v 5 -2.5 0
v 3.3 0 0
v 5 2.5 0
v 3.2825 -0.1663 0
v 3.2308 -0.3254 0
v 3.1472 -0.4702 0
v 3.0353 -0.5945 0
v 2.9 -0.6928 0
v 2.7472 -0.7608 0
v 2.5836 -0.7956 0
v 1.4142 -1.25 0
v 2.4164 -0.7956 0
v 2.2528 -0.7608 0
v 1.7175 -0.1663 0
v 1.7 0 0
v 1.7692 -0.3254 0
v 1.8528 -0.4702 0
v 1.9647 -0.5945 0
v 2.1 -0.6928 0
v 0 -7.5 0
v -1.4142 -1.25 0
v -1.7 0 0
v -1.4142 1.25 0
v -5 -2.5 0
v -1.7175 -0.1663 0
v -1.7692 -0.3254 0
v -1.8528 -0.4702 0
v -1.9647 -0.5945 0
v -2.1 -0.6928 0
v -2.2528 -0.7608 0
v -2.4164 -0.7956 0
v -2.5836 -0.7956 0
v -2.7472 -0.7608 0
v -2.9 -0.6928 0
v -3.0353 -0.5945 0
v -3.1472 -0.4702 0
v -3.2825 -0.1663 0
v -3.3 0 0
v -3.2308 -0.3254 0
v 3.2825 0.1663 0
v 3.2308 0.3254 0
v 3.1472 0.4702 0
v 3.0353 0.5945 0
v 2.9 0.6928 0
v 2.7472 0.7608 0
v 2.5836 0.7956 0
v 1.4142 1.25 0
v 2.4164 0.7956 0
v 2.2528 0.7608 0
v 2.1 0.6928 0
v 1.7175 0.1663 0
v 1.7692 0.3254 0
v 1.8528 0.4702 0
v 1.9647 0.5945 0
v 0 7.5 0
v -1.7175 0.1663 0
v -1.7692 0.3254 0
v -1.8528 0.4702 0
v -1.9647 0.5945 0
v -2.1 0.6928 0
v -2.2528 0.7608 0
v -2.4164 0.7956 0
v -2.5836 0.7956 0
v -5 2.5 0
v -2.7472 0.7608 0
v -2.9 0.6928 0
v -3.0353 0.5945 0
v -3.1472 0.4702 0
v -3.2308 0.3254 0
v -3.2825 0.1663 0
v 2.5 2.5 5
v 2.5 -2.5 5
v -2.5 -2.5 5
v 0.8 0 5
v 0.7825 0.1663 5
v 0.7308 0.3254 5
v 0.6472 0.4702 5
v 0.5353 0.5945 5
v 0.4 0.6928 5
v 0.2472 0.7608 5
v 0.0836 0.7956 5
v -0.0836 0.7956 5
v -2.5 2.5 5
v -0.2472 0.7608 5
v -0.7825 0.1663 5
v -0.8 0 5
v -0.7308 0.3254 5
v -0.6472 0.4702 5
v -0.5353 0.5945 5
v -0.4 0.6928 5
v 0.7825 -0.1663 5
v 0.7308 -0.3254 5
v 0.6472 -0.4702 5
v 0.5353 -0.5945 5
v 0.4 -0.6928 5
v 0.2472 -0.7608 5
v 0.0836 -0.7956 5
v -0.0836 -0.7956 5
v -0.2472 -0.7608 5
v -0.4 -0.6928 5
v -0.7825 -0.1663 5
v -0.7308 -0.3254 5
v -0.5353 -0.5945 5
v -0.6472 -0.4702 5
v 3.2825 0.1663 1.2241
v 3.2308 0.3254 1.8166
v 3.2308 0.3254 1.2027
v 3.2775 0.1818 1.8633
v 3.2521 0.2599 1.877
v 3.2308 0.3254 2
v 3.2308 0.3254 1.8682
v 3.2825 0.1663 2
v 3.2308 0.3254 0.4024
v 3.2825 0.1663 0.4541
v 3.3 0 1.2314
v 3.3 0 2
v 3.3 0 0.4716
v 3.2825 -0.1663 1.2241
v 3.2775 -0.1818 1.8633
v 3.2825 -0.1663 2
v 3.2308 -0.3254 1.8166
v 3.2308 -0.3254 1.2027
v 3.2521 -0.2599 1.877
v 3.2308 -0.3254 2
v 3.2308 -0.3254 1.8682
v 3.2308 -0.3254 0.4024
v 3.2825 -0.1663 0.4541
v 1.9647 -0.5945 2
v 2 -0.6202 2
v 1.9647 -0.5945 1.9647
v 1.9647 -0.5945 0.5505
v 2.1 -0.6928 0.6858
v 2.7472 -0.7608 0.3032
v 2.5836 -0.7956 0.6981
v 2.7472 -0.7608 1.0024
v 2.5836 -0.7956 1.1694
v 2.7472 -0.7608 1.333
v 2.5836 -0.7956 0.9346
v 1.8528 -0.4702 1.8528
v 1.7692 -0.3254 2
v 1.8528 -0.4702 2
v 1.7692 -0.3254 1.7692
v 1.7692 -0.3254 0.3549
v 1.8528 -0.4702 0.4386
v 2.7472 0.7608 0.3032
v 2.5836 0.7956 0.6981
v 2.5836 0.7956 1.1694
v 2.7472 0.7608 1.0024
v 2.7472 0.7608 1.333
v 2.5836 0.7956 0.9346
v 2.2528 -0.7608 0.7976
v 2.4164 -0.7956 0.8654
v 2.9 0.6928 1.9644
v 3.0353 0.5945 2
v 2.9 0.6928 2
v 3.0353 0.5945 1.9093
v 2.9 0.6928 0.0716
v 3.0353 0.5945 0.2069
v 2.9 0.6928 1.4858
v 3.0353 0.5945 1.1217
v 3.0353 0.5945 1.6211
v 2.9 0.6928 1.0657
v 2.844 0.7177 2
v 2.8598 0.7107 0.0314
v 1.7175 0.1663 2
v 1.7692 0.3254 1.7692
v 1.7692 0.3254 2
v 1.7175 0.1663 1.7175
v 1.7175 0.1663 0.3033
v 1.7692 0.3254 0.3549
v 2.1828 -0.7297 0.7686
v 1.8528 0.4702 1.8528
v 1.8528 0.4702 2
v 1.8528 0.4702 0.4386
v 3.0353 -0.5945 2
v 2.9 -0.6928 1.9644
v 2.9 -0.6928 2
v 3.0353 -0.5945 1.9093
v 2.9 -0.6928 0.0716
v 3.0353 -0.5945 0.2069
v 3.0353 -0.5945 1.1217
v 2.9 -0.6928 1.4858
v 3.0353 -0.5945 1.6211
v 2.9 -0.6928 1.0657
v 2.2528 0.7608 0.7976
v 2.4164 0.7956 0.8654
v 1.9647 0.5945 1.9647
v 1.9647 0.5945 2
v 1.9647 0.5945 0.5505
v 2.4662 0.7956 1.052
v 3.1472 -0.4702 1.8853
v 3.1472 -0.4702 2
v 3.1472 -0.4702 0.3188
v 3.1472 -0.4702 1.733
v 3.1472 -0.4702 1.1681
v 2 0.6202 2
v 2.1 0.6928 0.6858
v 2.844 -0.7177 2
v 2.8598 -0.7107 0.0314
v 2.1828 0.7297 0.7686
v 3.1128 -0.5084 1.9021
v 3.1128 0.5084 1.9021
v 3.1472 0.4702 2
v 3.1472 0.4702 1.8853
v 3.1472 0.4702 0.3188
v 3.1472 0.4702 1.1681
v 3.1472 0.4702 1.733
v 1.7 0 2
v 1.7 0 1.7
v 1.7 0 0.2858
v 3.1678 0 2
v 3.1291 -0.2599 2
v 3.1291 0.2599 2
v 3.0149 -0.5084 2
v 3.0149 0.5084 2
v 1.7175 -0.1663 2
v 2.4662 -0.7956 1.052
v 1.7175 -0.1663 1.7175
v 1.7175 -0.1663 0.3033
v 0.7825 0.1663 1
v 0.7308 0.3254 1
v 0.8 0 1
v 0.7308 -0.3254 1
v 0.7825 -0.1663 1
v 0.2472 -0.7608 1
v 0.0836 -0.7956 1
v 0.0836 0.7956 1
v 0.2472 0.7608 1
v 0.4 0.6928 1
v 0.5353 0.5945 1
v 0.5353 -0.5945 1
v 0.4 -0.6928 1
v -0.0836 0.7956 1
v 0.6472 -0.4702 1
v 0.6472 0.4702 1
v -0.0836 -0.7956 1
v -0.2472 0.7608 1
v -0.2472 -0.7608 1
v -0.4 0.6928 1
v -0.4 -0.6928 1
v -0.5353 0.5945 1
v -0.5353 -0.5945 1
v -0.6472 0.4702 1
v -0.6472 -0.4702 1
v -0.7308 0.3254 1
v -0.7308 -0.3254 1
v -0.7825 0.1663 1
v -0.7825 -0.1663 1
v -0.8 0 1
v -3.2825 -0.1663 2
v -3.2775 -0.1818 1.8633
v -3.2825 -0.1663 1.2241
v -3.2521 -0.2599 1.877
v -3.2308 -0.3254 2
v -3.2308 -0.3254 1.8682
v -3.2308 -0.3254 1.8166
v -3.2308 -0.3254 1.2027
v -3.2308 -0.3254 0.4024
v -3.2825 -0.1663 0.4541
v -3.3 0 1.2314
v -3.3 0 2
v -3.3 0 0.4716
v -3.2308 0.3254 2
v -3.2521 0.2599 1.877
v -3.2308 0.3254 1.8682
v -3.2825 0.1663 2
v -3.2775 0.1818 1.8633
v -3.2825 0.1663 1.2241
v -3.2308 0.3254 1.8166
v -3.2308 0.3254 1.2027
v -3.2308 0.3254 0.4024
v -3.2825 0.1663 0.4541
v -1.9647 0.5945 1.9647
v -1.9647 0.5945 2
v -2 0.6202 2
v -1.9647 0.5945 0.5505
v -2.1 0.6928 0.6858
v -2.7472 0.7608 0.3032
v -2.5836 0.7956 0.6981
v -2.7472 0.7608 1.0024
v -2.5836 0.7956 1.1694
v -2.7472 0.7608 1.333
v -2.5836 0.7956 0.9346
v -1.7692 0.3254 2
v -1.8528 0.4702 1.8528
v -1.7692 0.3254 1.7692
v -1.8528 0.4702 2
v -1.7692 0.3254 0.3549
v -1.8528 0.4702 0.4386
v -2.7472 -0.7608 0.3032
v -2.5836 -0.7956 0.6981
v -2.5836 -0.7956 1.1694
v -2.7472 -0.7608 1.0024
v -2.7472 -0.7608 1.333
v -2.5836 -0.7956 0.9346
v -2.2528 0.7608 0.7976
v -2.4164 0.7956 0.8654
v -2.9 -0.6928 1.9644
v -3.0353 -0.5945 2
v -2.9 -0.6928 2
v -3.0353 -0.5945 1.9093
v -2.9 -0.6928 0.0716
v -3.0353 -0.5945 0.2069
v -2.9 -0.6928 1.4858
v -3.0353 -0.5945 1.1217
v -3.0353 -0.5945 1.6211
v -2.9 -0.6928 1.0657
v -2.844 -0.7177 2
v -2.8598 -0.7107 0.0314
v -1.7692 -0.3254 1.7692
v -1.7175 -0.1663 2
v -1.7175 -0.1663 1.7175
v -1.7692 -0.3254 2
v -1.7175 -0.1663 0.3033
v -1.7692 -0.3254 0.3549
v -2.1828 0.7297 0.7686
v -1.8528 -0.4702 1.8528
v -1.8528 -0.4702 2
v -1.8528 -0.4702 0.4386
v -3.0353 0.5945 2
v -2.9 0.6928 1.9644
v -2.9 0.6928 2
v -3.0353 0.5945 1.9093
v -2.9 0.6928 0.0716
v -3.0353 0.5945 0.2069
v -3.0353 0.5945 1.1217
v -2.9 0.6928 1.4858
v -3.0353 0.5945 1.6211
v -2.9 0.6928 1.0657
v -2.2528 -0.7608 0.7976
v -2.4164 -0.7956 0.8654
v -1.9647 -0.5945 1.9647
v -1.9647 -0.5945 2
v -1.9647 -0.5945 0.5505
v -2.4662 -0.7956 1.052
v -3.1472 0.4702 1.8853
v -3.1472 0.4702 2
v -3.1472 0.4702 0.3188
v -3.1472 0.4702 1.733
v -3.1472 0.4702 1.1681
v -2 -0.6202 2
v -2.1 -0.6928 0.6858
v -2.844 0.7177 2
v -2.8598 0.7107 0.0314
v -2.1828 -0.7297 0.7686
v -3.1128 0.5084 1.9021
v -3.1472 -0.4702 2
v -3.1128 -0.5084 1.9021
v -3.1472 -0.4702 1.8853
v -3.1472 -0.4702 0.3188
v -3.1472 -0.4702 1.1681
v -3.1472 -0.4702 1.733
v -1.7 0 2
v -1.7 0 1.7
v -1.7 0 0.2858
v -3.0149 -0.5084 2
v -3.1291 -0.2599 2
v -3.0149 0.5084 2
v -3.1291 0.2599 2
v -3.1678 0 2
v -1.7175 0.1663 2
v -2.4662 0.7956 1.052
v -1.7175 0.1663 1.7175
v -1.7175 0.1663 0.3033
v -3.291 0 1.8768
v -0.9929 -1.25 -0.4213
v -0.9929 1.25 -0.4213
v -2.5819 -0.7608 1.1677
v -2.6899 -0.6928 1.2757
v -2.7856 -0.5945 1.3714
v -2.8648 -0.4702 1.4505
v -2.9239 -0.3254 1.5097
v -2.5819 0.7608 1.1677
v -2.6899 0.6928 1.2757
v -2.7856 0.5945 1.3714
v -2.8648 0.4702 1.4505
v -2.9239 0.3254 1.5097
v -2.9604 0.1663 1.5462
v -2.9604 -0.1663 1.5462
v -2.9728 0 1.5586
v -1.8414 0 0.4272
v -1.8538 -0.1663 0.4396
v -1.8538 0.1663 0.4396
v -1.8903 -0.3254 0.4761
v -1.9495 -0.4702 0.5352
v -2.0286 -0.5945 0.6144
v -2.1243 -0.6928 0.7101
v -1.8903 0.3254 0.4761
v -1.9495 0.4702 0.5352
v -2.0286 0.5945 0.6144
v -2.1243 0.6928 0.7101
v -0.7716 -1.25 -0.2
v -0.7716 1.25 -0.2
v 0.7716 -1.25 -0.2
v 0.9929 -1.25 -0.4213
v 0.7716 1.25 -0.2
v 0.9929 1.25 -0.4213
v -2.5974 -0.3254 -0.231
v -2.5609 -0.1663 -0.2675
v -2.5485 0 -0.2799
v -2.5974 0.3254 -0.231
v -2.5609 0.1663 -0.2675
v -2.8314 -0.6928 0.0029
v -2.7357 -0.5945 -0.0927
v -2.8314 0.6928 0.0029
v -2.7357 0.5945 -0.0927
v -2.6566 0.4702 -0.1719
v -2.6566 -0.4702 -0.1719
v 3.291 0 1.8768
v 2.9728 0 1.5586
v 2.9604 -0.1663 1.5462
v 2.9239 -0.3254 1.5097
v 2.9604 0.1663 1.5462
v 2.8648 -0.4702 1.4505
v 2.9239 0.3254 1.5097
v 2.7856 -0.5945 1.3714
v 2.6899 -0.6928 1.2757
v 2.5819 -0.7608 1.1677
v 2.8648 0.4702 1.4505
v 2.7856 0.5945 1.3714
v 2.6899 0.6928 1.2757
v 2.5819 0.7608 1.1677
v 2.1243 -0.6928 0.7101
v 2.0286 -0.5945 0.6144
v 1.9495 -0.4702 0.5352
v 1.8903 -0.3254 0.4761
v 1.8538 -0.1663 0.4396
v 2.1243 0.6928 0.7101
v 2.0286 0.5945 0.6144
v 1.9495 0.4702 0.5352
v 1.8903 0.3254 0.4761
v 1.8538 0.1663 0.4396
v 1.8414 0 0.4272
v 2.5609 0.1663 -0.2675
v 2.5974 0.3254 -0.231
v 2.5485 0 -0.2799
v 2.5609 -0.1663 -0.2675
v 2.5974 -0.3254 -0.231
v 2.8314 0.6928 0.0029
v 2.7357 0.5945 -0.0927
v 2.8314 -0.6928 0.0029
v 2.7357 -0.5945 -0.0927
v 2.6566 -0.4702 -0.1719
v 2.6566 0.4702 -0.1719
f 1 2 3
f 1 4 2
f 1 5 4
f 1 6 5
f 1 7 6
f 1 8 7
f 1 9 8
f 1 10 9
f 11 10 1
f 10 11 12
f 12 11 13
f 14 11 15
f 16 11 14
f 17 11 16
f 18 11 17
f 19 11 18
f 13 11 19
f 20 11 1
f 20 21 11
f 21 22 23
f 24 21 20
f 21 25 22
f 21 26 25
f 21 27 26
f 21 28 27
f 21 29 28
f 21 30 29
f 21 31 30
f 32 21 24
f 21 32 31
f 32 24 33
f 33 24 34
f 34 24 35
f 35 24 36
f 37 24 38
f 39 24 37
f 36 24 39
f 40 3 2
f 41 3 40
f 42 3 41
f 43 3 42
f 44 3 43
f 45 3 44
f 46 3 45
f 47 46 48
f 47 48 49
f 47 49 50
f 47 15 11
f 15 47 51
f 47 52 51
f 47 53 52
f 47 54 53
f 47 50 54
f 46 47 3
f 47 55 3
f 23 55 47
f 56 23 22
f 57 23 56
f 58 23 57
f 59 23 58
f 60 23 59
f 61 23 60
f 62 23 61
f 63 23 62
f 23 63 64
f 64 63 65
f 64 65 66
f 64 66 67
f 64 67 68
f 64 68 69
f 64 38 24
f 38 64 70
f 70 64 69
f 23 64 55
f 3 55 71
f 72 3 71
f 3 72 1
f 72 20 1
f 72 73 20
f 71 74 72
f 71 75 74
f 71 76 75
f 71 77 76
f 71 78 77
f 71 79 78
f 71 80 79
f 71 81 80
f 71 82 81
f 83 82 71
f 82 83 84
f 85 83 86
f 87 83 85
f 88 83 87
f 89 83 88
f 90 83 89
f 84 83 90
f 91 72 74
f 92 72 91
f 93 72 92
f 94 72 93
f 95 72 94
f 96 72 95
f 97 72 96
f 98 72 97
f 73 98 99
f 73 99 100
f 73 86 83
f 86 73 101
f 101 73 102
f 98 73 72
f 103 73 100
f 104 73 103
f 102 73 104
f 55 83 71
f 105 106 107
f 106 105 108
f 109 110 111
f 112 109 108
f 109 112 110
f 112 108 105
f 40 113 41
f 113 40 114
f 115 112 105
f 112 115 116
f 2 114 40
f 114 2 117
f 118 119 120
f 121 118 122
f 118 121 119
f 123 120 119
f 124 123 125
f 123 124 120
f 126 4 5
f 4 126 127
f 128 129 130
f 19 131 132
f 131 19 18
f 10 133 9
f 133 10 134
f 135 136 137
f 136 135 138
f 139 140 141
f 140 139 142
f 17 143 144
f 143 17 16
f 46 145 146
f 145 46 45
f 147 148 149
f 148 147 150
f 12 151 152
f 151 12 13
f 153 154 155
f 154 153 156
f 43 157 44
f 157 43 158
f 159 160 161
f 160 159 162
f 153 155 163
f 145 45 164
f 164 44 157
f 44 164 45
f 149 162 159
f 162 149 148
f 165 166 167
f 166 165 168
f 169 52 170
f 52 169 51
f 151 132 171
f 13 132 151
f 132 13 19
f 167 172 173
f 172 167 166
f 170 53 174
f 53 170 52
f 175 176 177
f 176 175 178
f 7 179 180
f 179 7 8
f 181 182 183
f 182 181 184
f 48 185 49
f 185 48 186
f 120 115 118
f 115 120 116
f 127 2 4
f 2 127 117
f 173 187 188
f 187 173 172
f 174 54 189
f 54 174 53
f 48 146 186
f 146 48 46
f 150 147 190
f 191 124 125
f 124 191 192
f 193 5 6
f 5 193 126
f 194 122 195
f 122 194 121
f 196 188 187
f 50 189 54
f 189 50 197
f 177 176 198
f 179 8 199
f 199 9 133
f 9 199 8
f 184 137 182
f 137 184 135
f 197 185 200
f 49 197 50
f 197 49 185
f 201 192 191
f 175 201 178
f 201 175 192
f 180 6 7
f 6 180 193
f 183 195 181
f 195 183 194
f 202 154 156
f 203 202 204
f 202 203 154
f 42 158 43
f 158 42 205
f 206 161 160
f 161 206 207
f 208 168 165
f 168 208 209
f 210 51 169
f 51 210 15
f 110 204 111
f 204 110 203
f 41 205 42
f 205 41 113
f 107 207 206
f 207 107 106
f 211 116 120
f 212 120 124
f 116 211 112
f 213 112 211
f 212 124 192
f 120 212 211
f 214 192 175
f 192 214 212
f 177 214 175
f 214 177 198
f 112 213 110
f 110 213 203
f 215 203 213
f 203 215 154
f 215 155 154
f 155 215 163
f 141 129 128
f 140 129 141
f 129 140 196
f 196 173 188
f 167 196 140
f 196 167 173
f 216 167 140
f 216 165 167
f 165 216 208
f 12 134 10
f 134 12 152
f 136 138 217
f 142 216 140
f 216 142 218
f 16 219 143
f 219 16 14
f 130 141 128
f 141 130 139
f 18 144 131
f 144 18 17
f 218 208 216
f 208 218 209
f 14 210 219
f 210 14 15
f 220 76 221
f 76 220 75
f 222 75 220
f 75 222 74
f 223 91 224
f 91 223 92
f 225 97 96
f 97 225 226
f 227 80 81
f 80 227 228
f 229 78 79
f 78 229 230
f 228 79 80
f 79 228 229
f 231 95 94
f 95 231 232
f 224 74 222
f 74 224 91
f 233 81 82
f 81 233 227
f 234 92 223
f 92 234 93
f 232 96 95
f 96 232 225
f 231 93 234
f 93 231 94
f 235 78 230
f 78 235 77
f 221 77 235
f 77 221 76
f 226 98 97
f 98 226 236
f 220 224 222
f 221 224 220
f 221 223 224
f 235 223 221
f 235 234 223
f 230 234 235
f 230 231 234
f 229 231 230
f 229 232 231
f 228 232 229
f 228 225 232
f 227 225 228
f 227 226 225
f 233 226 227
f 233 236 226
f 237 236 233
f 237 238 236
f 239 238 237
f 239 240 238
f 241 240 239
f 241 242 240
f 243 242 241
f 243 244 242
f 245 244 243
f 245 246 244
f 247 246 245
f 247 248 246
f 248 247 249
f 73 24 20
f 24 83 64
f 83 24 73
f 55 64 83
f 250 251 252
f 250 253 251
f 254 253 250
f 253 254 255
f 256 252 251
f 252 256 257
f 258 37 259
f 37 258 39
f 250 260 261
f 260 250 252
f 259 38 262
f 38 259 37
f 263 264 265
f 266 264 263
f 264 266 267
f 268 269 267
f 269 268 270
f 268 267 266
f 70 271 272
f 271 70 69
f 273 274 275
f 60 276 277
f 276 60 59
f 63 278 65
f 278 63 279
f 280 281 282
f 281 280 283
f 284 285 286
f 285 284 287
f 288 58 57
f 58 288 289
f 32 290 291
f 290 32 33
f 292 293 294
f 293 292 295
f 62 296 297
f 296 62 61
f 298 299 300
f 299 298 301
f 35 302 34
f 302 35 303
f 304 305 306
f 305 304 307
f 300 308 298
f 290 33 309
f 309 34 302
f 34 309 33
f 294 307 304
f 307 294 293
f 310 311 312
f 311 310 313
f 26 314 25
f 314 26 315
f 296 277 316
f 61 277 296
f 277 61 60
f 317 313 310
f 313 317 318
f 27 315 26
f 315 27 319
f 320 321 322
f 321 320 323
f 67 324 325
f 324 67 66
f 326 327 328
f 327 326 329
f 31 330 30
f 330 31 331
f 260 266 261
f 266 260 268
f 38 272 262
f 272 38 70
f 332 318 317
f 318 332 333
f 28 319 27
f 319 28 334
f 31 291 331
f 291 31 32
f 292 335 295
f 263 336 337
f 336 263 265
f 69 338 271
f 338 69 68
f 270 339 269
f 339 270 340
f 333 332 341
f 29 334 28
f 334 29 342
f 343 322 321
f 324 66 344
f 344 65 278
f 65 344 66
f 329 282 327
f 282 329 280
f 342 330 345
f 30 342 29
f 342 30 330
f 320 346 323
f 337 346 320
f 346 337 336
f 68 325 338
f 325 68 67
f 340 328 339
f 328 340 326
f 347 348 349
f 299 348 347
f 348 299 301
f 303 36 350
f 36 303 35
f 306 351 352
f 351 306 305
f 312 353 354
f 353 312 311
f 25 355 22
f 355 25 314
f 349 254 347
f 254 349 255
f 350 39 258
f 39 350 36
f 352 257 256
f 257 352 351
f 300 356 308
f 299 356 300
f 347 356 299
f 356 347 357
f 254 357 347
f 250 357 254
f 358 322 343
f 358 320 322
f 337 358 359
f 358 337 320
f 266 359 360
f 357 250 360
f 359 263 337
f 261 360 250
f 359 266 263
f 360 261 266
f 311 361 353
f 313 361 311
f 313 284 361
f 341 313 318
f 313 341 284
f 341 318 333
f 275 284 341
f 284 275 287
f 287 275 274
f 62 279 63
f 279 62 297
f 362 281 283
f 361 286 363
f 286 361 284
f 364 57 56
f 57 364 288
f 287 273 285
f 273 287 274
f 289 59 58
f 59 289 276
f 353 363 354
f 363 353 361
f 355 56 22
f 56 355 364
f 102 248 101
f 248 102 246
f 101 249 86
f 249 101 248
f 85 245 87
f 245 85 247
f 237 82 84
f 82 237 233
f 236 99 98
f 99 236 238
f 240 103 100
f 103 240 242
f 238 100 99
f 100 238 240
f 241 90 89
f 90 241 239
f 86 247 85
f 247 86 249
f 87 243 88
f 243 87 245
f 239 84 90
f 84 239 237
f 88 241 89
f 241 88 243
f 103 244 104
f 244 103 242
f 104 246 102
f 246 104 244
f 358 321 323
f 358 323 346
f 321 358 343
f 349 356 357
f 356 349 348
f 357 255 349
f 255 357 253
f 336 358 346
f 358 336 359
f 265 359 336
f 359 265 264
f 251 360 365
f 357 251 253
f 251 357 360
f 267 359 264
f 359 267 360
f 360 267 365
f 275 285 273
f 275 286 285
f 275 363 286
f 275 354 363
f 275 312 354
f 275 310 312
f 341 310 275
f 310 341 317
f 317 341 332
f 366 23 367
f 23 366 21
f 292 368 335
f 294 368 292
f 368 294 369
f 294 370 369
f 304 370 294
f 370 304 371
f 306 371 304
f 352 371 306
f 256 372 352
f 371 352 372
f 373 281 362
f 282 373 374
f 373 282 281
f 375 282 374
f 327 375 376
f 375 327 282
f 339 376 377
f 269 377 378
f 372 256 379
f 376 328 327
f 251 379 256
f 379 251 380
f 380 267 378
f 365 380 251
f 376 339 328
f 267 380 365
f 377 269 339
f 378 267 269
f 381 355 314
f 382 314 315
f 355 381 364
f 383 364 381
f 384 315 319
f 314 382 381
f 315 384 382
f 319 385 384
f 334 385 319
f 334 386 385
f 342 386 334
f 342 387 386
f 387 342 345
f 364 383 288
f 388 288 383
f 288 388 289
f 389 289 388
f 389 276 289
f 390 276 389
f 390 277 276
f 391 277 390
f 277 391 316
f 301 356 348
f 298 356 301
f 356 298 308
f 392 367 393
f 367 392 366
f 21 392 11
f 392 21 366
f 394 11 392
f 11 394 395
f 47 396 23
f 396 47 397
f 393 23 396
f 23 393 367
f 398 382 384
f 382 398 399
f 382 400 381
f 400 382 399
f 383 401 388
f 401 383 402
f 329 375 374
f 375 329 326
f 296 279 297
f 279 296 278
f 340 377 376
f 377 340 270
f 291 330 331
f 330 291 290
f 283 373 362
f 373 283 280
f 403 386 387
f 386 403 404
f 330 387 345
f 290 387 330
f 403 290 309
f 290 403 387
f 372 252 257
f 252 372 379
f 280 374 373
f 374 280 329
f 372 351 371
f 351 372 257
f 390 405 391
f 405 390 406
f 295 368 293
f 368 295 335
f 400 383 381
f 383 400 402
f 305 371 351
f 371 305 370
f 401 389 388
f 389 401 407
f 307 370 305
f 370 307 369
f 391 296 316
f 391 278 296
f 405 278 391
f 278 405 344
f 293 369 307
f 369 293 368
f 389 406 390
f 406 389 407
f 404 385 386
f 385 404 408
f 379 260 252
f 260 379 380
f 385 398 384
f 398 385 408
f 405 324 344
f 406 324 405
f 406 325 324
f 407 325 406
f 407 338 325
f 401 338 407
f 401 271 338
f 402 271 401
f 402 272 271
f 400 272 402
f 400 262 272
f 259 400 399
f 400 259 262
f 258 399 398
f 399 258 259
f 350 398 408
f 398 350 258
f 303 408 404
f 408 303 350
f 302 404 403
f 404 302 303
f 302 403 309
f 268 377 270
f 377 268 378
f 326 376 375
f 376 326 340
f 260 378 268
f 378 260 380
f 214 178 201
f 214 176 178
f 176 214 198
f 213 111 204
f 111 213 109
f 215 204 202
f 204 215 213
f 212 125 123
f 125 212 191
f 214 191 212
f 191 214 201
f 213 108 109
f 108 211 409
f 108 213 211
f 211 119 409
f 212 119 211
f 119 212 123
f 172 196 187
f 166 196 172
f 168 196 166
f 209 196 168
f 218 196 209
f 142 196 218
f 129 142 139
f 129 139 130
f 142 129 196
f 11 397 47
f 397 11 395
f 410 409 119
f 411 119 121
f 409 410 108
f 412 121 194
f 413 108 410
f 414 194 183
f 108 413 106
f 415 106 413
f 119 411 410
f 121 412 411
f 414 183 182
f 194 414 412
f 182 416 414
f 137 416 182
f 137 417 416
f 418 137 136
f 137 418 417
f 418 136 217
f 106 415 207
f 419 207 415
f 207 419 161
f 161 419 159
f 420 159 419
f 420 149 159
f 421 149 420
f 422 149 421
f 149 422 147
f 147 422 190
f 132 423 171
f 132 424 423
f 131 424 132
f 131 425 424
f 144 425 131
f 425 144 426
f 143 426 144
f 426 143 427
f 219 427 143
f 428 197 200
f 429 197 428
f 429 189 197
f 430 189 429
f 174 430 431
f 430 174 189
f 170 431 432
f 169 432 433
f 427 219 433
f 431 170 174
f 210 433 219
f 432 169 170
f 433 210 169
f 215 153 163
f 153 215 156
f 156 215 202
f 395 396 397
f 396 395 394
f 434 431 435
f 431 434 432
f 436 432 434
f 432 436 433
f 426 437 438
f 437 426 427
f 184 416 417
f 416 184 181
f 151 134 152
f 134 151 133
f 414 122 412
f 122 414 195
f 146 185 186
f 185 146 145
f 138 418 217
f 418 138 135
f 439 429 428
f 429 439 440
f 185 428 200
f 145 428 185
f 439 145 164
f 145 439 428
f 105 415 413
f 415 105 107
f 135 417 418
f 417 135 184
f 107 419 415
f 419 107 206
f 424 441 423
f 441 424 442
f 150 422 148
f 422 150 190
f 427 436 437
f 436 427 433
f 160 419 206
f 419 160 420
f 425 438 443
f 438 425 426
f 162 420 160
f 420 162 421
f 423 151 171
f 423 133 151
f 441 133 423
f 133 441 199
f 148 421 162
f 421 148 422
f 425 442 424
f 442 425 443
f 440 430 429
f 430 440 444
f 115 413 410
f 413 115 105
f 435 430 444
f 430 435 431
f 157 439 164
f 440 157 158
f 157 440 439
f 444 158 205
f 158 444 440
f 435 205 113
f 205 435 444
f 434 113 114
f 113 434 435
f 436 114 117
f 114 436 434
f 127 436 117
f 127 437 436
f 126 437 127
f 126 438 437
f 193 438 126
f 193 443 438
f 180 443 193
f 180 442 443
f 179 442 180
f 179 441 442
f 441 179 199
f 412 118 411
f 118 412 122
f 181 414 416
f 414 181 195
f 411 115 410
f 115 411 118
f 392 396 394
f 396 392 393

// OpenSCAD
$fn =30;
base =5;
module peghole(){
    color("Blue")cylinder (6, .8, .8, true);
}
// the peg hole template, a change in size here changes hole everywhere
module peg(){
    cylinder (2, .8, .8);
}

module edge(){
cylinder (base, 3.25, 3.25, true);
}
// a cylinder for making block


module block(){
    intersection(){
edge();
rotate([90,0,0]) edge();
rotate([0, 90, 0]) edge();
}
}
// create the base cube without the holes


module blox(){
difference(){ 
block();
   peghole();
rotate ([90, 0, 0]) peghole();
rotate ([0, 90, 0]) peghole();
}
}
//unembeleshed blox cube
module corner(){difference(){
    block();
   translate([-3,-3,3])rotate([0,45,0])
cube([8,6
   ,4]) color("Red");
 rotate([0,90,0])
   translate([0,0,-4]) peghole();
 translate([0,0,-4]) peghole();   
 rotate([0,45,0]) translate([0,0,1])peghole();   
}
}
    
//anled blox piece

module side(){
    blox();
    translate([0,0,base])corner();
translate([0,0,-base]) rotate([0,90,0]) corner();
}
// Pentagram side of octagon, can be own piece

module 3long() {
    blox();
    translate([0,0,base]) blox();
    translate([0,0,-base]) blox();
}
module oct() {
3long();
translate([5,0,0]) side();
translate([-5,0,0]) rotate([0,180,0]) side();
}
// one octagon of blox, can be used as own piece

module longside() {
side();
translate([0,base,0]) side();
translate([0,-base,0]) side();
}
// long side can be used as own piece

module hexlong(){
longside();
translate([-base,0,0]) rotate([0,180,0]) longside();
}
// long side in the combined form, usable as piece

module 3X3() {
3long();
translate([0,base,0]) 3long();
translate([0,-base,0]) 3long();
}
// plate of 3X3 blox can be used as own piece

module long(){
    oct();
translate([0,base,0]) oct();
translate([0,-base,0]) oct();
}
// octoganal tube with solid fill

module longhollow(){
difference(){
long();
cube([10,10,base], true);
cube([base,10,10], true);
}
}
// lighter octoganal tube

module test(){
translate([0,0,10]) blox();
rotate([0,45,0]) translate([0,0,9.5]) blox();
}
// set up angle for bracket design
module core() {
    color("Red") translate([0,0,2.5]) blox();
    color("Red");
}
// a test blox to position in cap
module caplower(){
CapPoints = [ [0,1.5*base,0],[base,.5*base,0],[base,-.5*base,0],[0,-1.5*base,0],[0,2.35,4.6],[2.35,2.35,4.6],[2.35,-2.35,4.6],[0,-2.35,4.6] ];
CapFaces = [ [0,1,2,3],[1,0,5],[3,2,6],[3,6,7],[3,7,4,0],[2,1,5,6],[5,4,7,6],[4,5,0] ];
polyhedron(CapPoints, CapFaces,convexity = 1);
}
// creates a cap with a petruding blox, needs finetuning

module halfflatcap() {
    CapPoints = [ [0,1.5*base,0],[base,.5*base,0],[base,-.5*base,0],[0,-1.5*base,0],[0,.5*base,base],[.5*base,.5*base,base],[2.5,-.5*base,base],[0,-2.5,base] ];
CapFaces = [ [3,2,1,0],[5,0,1],[6,2,3],[7,6,3],[0,4,7,3],[6,5,1,2],[6,7,4,5],[0,5,4] ];
difference(){
    polyhedron(CapPoints, CapFaces,convexity = 1);
translate([.5*base,0,-1]) peghole();
translate([0,0,4]) peghole();
}
}
// make half a cao for hex with sides flush with top of blox
module fulflatcap() {
    halfflatcap();
rotate ([0,0,180]) halfflatcap();
}

fulflatcap();
// make cap for hex with sides flush with top of blox
//difference(){
module wingspots(){
    rotate([0,-90,0]) side();
translate([0,0,-base])
union(){
   test();
rotate([0,0,180]) test();

}
}
// test of wing spots,
//why does diference with core not work

module test2() {
difference(){
    wingspots();
translate([0,0,base
   ]) cube(5.005
   ,true);
    //messing with a hairs breadth as blox() ads a tiny hight change
}
//blox();
}
// test for bracket between octagon angles
module bracketendb(){
cylinder(1,1.25,1.25);
translate([0,-1.25,0]) cube([2,2.5,1]);
    peg();
}
module bracketpegs() {
    translate([-4.5,0,2]) rotate ([180,45,0]) bracketendb();
translate([4.5,0,2]) rotate ([0,135,0]) bracketendb();
translate([0,0,.5]) cube([7,2.5,1], true);
translate([0,0,-2]) peg();
}
module acutebracket() { 
     translate([-1,,-1.25,-2])rotate([0,45,0]) cube([1,2.5,1]);
    rotate([0,90,180]) bracketendb();
translate([.75,0,-.75]) rotate([0,135,0])  bracketendb();
}
//bracket for flat to angled wings
module hexwings() {
    translate([0,0,2.5]) wingspots();
rotate([0,180,0]) translate([0,0,2.5]) wingspots();
}
//test rig for hexbody wing placement
module smallrightbrace() {
    translate([-1.7,0,1.7]) rotate([0,135,180]) bracketendb();
translate([1.7,0,1.7])rotate([180,45,180]) bracketendb();
translate([0,0,.3]) cube([2,2.5,1], true);
}
smallrightbrace();
// bracket for angled wings on hex body
//some trimming could be done
